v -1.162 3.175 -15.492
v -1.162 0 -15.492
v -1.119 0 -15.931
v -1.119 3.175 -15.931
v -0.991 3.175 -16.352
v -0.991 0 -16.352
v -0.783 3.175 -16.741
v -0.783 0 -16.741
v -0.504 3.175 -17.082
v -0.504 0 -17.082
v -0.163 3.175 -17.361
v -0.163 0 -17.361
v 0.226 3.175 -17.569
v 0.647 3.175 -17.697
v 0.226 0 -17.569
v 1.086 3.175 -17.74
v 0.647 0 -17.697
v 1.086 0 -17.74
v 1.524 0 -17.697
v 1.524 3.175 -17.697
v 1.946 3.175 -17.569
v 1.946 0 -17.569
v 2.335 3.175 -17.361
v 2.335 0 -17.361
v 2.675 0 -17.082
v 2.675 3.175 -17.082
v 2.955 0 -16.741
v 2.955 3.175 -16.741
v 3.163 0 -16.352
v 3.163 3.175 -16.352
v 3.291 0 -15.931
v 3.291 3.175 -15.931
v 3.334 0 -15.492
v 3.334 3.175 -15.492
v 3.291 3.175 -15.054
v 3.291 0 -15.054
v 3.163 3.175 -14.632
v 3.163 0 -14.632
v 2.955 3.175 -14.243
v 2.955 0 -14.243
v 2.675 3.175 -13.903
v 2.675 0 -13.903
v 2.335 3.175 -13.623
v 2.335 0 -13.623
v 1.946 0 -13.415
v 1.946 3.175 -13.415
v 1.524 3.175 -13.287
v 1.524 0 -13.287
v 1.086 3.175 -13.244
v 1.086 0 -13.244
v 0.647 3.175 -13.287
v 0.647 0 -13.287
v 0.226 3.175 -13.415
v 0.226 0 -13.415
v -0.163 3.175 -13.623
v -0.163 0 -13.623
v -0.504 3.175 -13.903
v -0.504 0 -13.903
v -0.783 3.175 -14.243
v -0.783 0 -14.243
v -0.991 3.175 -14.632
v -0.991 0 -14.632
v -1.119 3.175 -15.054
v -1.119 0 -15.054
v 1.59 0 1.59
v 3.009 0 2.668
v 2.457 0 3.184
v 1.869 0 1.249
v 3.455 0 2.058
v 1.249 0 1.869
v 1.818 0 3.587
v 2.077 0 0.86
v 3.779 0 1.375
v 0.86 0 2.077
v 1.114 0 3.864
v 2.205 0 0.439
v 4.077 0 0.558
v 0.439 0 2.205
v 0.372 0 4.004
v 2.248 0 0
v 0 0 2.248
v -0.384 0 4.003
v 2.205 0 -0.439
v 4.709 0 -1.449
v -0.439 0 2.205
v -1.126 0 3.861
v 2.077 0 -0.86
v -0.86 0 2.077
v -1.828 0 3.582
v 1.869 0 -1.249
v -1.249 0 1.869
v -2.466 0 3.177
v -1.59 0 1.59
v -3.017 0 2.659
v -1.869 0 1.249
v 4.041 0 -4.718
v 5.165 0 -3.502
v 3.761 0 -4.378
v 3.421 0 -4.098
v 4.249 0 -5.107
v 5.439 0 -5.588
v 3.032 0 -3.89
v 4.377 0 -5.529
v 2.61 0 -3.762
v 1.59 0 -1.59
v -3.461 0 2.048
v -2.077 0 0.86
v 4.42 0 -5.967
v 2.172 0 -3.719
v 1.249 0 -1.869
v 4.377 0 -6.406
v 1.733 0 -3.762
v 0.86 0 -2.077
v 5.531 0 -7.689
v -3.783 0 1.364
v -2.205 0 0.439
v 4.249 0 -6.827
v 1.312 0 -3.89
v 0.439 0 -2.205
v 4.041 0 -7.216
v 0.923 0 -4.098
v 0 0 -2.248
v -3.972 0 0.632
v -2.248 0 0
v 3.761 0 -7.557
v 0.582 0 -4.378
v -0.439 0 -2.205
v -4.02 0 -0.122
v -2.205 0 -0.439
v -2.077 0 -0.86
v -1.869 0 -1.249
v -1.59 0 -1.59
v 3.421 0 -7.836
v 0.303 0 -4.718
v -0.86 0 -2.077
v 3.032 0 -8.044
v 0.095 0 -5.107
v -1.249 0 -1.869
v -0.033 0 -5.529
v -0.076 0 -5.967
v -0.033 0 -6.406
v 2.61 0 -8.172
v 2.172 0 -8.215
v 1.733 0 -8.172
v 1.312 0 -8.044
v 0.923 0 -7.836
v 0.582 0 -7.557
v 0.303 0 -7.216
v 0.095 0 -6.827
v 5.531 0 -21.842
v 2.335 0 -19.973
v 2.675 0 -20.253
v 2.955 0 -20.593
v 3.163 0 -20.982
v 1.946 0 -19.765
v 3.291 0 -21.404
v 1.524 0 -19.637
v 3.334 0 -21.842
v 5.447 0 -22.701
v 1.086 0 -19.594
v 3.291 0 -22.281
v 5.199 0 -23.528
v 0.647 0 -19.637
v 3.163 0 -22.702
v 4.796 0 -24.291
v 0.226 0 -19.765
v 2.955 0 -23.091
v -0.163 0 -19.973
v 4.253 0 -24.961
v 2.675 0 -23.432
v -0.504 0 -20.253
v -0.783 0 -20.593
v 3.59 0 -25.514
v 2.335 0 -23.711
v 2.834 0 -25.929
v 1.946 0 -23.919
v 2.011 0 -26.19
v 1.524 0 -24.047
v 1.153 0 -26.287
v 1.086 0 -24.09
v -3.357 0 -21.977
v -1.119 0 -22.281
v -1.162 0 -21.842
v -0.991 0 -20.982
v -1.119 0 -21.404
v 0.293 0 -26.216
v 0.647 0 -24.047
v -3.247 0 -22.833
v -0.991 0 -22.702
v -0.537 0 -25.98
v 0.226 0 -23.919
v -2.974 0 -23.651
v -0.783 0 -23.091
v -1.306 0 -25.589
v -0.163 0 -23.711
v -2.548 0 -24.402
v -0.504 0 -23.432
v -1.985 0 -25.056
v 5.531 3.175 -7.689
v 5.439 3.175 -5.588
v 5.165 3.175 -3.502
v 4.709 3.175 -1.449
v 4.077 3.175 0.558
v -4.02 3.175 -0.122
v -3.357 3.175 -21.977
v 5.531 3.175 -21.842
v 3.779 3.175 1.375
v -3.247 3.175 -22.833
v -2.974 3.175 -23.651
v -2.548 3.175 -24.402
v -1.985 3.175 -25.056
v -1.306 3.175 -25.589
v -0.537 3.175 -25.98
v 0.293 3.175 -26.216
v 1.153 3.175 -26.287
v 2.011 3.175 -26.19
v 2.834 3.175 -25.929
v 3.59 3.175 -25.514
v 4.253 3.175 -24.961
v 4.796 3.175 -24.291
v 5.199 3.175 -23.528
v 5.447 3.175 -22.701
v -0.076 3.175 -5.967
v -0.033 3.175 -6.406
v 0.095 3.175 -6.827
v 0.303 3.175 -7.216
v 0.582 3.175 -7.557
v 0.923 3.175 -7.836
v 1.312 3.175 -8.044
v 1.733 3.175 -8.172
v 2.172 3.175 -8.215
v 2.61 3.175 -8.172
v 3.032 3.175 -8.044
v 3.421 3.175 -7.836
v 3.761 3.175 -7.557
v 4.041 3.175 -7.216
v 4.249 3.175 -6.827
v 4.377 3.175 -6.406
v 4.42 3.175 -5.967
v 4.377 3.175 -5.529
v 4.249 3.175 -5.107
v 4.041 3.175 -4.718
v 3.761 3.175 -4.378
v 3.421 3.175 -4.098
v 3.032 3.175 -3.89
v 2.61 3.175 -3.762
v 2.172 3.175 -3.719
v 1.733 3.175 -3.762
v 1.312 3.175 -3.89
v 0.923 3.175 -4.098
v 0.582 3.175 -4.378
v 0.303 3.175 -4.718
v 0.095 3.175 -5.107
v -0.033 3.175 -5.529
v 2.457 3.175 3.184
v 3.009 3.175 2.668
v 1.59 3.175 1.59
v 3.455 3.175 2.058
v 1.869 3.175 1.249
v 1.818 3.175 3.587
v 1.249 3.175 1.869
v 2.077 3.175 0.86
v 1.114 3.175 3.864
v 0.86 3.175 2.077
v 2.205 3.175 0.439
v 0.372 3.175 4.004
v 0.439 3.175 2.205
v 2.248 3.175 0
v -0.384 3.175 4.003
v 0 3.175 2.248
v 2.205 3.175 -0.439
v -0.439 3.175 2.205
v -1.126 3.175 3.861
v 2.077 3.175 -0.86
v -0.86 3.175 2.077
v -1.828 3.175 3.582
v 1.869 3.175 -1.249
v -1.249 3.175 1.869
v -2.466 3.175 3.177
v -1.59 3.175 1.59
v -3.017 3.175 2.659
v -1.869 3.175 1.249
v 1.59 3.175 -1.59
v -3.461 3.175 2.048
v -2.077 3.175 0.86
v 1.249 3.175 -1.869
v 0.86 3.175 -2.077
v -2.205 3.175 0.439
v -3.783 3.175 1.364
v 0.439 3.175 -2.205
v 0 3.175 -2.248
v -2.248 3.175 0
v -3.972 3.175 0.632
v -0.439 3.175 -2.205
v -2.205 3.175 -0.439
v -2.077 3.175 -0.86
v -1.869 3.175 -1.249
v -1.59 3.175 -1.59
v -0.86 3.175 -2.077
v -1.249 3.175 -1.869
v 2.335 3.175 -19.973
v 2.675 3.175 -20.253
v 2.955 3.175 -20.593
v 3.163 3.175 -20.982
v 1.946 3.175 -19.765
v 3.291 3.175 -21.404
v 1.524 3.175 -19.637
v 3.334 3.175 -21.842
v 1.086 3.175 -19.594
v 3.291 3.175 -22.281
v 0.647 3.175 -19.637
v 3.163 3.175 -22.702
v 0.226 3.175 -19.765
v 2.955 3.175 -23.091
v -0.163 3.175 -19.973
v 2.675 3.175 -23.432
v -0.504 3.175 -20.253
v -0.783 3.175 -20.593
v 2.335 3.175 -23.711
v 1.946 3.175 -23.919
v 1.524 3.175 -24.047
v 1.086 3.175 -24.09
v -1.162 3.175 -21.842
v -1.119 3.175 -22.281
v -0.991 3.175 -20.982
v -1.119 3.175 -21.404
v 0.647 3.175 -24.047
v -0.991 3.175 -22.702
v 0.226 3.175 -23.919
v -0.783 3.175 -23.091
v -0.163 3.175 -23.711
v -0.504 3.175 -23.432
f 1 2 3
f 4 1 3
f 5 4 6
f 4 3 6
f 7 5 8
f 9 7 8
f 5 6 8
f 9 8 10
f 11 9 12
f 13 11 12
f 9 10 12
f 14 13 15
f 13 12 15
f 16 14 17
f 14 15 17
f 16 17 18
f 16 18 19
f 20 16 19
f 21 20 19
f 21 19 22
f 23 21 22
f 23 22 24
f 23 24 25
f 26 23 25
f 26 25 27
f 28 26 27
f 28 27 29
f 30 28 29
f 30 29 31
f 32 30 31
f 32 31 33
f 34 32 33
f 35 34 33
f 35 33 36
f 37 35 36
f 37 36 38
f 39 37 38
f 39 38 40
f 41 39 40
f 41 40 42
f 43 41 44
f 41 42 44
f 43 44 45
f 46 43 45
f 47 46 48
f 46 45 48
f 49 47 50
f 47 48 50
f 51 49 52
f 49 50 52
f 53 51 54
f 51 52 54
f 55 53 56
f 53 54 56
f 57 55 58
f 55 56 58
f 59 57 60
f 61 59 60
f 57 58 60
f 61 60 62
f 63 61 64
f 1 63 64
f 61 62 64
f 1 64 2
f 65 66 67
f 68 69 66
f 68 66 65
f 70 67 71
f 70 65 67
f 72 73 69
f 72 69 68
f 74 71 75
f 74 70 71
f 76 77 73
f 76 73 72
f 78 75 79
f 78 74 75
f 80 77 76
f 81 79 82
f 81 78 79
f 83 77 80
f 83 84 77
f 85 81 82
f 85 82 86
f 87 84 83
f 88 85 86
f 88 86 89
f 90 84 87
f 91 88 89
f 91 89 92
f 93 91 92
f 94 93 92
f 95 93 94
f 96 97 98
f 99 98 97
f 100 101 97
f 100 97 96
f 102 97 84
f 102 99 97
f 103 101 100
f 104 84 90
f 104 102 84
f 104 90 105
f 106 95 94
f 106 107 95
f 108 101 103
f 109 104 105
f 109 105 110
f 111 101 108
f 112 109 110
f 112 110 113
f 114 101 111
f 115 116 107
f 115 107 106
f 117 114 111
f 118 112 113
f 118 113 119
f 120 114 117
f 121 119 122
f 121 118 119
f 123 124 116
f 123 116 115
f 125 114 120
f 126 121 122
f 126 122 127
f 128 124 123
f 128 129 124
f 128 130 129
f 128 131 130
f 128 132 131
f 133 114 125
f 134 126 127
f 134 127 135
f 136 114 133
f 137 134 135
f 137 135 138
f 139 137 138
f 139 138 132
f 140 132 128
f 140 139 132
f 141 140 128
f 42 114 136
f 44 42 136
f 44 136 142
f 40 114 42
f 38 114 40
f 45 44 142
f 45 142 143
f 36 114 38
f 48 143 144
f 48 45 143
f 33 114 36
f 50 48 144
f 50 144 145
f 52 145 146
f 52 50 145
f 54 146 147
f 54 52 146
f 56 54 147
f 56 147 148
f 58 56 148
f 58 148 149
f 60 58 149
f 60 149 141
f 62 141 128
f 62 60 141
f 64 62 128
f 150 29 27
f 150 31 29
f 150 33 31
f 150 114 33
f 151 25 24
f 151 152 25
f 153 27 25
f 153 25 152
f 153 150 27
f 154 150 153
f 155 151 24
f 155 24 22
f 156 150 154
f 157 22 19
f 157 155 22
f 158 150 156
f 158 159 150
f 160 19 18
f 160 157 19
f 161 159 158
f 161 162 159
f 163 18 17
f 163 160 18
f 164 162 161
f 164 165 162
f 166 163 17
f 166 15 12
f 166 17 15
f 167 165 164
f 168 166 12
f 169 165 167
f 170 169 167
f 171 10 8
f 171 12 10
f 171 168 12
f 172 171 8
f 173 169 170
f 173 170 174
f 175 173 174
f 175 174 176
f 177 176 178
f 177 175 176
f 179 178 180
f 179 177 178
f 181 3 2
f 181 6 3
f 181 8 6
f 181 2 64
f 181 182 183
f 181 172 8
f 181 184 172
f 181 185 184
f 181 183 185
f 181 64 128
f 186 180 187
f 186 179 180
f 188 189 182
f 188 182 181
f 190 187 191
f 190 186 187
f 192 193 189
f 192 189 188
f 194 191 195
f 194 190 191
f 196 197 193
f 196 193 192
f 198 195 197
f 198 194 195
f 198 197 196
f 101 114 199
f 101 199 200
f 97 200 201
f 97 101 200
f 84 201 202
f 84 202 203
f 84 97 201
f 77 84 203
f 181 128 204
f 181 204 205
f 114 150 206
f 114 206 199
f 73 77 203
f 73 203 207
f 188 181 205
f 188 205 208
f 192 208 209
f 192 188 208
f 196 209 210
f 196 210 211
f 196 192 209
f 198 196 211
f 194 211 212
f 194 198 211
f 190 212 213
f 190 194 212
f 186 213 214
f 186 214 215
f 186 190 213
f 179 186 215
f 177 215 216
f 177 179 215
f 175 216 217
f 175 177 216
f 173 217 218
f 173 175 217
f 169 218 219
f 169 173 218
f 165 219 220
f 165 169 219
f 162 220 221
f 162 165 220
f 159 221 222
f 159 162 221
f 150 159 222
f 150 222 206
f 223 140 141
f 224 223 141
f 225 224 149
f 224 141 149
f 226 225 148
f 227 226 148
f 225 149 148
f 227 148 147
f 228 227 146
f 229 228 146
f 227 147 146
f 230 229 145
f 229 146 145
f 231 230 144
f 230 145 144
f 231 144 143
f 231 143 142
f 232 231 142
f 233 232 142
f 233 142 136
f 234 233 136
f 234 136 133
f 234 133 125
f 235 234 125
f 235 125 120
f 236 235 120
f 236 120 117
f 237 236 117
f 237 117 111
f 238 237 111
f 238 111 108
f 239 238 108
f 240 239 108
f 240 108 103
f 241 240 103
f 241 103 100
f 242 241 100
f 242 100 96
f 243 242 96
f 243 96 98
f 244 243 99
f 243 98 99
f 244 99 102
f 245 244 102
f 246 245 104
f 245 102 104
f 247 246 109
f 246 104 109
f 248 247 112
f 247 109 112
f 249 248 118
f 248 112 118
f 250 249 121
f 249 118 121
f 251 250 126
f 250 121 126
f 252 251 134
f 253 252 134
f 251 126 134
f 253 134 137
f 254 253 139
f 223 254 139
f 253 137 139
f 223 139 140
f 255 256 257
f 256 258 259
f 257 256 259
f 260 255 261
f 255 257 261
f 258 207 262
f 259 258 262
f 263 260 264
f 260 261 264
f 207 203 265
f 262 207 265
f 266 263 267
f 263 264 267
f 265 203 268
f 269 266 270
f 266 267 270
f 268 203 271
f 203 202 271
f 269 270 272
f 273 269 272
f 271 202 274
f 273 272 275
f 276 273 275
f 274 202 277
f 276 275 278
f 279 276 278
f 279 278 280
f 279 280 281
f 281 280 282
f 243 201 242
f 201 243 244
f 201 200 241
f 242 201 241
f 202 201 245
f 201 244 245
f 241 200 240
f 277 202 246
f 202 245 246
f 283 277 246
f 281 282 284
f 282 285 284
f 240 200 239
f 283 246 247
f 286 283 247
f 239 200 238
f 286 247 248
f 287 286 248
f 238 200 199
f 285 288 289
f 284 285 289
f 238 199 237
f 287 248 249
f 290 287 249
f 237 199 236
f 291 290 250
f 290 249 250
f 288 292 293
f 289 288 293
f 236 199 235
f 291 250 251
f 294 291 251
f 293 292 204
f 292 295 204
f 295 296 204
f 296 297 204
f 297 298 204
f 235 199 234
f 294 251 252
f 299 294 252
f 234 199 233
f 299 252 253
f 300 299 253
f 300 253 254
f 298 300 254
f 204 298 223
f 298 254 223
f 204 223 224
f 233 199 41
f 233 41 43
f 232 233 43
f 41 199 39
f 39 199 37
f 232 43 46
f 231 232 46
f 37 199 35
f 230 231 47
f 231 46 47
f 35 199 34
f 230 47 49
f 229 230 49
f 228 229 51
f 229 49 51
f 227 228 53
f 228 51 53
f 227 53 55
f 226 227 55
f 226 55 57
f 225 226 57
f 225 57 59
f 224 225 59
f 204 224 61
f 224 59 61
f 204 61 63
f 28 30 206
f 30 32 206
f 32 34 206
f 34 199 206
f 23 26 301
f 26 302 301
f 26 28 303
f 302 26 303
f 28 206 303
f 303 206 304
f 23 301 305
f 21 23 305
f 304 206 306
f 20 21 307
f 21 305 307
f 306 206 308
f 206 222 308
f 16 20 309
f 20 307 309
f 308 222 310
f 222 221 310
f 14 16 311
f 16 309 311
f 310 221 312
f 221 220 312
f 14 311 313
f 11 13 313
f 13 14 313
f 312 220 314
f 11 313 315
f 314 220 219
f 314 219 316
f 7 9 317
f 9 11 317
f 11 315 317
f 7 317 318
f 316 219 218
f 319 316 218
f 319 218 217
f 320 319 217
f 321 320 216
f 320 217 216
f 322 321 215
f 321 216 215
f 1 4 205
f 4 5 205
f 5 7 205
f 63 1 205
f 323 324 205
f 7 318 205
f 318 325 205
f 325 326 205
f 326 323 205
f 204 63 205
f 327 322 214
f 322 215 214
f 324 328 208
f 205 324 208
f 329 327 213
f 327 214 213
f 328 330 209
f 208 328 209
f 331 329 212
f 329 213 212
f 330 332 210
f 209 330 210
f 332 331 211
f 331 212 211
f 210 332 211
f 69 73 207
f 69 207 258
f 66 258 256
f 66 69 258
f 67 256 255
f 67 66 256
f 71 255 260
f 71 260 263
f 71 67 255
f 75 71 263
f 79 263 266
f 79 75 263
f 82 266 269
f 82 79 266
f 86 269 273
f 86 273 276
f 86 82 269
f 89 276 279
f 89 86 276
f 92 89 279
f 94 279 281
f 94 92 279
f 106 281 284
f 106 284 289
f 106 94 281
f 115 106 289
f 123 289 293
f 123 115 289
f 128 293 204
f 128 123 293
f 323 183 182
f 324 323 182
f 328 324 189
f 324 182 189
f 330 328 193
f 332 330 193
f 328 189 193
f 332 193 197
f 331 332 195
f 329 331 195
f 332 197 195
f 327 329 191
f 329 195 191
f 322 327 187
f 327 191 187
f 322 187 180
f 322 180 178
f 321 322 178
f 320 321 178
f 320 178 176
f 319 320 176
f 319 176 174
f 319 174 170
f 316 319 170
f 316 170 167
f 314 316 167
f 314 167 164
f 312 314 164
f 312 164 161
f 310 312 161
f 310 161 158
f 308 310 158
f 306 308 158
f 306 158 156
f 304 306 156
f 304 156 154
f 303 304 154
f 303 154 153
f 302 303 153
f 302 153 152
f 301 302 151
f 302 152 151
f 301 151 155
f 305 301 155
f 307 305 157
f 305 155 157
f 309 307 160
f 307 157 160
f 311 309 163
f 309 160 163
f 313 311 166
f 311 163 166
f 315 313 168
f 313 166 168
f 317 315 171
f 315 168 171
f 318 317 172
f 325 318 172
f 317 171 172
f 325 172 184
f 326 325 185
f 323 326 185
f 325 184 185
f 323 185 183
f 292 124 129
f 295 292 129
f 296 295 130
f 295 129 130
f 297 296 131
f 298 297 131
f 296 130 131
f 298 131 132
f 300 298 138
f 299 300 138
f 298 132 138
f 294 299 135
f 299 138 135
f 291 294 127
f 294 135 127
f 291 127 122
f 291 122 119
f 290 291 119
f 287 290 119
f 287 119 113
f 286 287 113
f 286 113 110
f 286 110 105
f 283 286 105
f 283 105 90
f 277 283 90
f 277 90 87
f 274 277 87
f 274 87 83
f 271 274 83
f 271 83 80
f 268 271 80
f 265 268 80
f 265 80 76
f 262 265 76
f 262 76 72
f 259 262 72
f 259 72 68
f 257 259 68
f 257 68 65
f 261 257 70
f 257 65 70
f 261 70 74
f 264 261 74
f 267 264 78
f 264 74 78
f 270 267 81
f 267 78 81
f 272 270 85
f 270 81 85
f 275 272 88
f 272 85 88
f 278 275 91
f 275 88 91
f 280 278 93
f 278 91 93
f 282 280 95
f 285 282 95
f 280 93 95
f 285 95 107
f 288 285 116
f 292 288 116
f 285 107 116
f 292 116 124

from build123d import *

# Parameters (mm, degrees)
BOSS_EXTRUDE3_DEPTH       = 3.175
F_8_CLEARANCE_HOLE1_D     = 4.4958
F_8_CLEARANCE_HOLE1_DEPTH = 41.402
F_8_CLEARANCE_HOLE1_TIP   = 1.350674586
F_8_CLEARANCE_HOLE2_D     = 4.4958
F_8_CLEARANCE_HOLE2_DEPTH = 41.402
F_8_CLEARANCE_HOLE2_TIP   = 1.350674586


with BuildPart() as part:
    # Sketch7 → Boss-Extrude3 (new body)
    with BuildSketch(Plane(origin=(0, 0, 0), x_dir=(1, 0, 0), z_dir=(0, 1, 0))):
        with BuildLine():
            Line((5.530913955, 21.842048142), (5.530913955, 7.688957681))
            ThreePointArc((5.530913955, 7.688957681), (5.164609953, 3.502083783), (4.07682791, -0.55757407))
            Line((4.07682791, -0.55757407), (3.77913049, -1.37549101))
            ThreePointArc((3.77913049, -1.37549101), (-0.758308624, -3.949527922), (-4.019818623, 0.121905765))
            Line((-4.019818623, 0.121905765), (-3.35704347, 21.976786093))
            ThreePointArc((-3.35704347, 21.976786093), (1.153290671, 26.286537469), (5.530913955, 21.842048142))
        make_face()
    extrude(amount=BOSS_EXTRUDE3_DEPTH)

    # #8 Clearance Hole1
    with Locations(Plane(origin=(0, 3.175, 0), x_dir=(1, 0, 0), z_dir=(0, 1, 0))):
        with Locations((2.17182791, 5.967048142), (0, 0)):
            Hole(F_8_CLEARANCE_HOLE1_D / 2, depth=F_8_CLEARANCE_HOLE1_DEPTH)
            with Locations((0, 0, -(F_8_CLEARANCE_HOLE1_DEPTH + F_8_CLEARANCE_HOLE1_TIP / 2))):  # 118° drill point
                Cone(0, F_8_CLEARANCE_HOLE1_D / 2, F_8_CLEARANCE_HOLE1_TIP, mode=Mode.SUBTRACT)

    # #8 Clearance Hole2
    with Locations(Plane(origin=(0, 3.175, 0), x_dir=(1, 0, 0), z_dir=(0, 1, 0))):
        with Locations((1.085913955, 21.842048142), (1.085913955, 15.492048142)):
            Hole(F_8_CLEARANCE_HOLE2_D / 2, depth=F_8_CLEARANCE_HOLE2_DEPTH)
            with Locations((0, 0, -(F_8_CLEARANCE_HOLE2_DEPTH + F_8_CLEARANCE_HOLE2_TIP / 2))):  # 118° drill point
                Cone(0, F_8_CLEARANCE_HOLE2_D / 2, F_8_CLEARANCE_HOLE2_TIP, mode=Mode.SUBTRACT)


solid = part.part
